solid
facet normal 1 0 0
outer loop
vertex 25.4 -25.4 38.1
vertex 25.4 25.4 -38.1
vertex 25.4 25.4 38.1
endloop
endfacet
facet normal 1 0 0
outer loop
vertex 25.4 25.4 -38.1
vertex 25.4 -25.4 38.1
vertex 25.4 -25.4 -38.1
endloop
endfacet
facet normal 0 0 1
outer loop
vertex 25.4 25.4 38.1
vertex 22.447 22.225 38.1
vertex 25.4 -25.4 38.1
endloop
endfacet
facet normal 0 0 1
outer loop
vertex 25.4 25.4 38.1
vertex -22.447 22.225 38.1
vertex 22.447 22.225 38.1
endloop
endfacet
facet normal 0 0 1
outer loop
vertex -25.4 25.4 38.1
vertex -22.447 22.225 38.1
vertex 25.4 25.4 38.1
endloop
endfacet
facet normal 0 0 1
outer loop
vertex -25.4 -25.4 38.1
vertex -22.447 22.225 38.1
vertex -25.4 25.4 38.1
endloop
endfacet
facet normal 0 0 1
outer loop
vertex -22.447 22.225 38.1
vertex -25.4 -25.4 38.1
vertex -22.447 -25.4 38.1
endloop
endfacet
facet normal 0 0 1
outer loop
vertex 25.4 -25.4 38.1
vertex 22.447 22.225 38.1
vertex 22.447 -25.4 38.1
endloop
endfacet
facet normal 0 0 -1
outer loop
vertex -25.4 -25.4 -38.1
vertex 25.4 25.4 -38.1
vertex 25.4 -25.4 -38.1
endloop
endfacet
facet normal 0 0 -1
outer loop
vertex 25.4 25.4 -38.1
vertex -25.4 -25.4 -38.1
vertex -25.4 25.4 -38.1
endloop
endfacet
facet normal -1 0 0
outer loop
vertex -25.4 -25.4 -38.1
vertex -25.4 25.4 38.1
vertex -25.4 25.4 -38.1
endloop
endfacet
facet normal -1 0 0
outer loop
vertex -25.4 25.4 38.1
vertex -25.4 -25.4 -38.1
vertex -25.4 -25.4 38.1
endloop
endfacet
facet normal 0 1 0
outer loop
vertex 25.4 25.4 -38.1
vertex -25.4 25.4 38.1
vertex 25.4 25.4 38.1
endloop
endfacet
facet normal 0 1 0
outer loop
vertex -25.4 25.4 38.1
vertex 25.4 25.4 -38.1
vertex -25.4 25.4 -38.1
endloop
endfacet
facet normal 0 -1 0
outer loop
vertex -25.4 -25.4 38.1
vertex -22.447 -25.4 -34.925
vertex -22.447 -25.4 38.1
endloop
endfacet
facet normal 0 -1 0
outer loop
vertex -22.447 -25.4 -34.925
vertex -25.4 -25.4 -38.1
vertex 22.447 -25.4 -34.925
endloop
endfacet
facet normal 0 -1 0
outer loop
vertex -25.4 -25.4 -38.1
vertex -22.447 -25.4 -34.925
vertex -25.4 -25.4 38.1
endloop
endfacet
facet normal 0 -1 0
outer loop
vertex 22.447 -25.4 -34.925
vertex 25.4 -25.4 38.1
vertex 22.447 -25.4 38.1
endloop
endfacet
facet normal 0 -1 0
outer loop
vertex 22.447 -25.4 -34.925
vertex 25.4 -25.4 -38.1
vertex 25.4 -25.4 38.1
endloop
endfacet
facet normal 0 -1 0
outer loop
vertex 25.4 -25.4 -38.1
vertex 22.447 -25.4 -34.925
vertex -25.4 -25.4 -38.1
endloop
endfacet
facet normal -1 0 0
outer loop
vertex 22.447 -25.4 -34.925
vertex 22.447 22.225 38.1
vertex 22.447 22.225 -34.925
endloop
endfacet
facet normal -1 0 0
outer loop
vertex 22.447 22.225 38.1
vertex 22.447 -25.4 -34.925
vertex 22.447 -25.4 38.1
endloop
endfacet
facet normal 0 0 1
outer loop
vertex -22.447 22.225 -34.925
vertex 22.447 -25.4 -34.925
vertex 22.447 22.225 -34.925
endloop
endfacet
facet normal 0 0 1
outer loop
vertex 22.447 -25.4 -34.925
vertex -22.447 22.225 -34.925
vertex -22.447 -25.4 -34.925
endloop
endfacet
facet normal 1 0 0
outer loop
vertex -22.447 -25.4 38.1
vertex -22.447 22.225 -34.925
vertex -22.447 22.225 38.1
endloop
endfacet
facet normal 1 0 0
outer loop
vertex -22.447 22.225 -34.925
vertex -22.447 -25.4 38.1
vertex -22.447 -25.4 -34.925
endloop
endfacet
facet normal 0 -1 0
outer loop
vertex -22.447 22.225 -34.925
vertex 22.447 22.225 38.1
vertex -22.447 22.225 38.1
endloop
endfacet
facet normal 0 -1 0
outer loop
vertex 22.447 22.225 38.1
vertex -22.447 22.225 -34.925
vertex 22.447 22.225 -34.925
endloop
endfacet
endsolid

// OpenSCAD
//BEGIN CUSTOMIZER VARIABLES
/*[door]*/
//How thick is the door?
doorWidth = 1.75;
//
catcherHeight = 3;
//
catcherLength = 2;
/*[advanced]*/
//How thick do you want it to be?
thickness = .125;
//allows units entered to be inches.
scaleFactor = 25.4;
//END CUSTOMIZER VARIABLES
scale(scaleFactor){
	difference(){
		cube([doorWidth+thickness*2,catcherLength,catcherHeight],center = true);
		translate([0,-thickness,thickness]){
			cube([doorWidth*1.01,catcherLength,catcherHeight],center = true);
		}
	}
}
